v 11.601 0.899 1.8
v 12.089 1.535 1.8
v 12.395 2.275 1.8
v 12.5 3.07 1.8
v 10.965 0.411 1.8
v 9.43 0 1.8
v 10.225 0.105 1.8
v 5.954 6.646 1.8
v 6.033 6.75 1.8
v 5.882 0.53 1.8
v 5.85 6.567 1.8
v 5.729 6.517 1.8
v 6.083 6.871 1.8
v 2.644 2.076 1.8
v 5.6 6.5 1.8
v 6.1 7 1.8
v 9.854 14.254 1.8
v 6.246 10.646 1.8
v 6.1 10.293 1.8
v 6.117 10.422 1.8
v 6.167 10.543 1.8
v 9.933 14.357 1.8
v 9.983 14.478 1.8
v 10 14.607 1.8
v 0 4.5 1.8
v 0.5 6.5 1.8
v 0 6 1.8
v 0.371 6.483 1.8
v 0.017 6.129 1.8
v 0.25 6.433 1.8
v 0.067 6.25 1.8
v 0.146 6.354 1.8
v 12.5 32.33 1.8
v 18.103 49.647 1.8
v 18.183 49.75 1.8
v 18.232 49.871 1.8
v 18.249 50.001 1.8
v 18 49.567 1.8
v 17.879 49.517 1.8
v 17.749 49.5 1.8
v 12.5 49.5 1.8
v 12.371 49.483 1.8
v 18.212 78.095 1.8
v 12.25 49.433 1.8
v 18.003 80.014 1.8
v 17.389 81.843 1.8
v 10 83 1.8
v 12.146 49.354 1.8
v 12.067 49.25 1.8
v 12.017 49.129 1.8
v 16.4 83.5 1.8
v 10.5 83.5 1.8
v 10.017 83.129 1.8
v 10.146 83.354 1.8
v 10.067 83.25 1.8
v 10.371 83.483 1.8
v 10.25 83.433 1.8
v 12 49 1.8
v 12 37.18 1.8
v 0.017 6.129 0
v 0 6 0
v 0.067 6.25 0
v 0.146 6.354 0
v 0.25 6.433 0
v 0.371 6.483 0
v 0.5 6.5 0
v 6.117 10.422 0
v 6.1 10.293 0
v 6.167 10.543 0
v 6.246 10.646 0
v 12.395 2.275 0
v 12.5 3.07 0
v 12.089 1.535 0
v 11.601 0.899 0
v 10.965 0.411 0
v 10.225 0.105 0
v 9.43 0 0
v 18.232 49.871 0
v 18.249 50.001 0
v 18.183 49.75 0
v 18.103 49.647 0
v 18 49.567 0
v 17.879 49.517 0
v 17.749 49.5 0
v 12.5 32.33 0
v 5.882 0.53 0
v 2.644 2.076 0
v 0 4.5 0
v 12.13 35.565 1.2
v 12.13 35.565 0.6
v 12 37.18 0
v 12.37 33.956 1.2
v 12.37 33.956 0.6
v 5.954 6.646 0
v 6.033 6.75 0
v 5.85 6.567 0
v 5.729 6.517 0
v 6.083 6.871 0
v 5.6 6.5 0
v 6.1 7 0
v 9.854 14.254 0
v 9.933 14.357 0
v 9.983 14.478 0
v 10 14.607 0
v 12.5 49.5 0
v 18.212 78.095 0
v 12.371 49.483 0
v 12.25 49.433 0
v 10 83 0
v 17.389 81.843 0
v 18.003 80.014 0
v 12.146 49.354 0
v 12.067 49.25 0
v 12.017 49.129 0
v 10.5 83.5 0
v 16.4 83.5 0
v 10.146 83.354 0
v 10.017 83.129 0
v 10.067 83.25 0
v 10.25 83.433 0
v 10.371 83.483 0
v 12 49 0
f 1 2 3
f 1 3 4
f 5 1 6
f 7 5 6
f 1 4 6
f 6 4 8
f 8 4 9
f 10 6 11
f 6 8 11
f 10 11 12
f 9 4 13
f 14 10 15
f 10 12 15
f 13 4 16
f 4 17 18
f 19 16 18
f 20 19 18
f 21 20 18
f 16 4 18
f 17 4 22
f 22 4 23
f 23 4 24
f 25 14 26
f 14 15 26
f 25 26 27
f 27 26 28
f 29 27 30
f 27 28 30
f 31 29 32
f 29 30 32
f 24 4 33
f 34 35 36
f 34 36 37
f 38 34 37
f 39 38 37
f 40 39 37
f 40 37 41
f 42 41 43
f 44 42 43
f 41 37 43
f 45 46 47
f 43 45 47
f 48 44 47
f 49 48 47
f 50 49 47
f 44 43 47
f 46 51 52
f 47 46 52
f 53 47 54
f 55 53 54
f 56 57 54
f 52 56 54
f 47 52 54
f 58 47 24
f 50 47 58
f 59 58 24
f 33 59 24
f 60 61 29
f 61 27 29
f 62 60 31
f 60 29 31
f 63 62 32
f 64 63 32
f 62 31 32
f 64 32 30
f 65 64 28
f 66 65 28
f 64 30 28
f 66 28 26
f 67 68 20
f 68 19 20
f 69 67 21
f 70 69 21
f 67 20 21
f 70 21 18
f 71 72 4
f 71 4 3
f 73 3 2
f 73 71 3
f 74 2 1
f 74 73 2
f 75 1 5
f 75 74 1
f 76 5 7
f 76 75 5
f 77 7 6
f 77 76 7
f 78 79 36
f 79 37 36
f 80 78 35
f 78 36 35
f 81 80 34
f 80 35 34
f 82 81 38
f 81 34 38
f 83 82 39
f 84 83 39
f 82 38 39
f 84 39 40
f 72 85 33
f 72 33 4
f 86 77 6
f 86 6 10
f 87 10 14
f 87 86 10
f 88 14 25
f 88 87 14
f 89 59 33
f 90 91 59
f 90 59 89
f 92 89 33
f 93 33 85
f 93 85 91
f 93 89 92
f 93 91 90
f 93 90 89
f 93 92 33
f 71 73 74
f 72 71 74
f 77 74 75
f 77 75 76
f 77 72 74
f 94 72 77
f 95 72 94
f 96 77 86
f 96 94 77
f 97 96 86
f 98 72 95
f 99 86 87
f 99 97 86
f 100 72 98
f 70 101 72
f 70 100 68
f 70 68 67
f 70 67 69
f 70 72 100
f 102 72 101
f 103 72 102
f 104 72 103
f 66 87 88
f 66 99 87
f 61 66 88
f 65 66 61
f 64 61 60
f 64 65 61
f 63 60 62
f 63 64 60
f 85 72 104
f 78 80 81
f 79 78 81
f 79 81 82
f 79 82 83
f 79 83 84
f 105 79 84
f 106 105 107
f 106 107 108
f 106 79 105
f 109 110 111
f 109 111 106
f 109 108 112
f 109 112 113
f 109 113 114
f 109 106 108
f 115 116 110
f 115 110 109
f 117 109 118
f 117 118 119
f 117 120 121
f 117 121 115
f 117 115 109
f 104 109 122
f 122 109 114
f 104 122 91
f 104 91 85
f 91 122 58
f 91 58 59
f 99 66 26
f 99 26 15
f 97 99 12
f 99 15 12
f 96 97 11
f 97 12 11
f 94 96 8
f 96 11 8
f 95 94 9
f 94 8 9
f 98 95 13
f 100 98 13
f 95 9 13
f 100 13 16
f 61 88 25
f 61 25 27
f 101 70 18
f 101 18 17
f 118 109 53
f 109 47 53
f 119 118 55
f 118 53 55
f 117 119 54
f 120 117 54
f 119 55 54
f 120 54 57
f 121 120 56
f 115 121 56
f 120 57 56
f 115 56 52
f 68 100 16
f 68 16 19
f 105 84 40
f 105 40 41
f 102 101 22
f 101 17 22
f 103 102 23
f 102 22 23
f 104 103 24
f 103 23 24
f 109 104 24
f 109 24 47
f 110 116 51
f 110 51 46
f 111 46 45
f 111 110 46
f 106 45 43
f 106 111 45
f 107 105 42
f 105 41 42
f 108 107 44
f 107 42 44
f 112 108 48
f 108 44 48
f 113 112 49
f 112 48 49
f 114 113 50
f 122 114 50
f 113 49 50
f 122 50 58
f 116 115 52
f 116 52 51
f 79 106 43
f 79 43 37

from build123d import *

# Parameters (mm, degrees)
BOSS_EXTRUDE1_DEPTH = 1.8
FILLET1_R           = 0.5


with BuildPart() as part:
    # Sketch1 → Boss-Extrude1 (new body)
    with BuildSketch(Plane.XY):
        with BuildLine():
            Line((0, 4.5), (0, 6.5))
            Line((0, 6.5), (6.1, 6.5))
            Line((6.1, 6.5), (6.1, 10.5))
            Line((6.1, 10.5), (10, 14.4))
            Line((10, 14.4), (10, 83.5))
            Line((10, 83.5), (16.4, 83.5))
            ThreePointArc((16.4, 83.5), (17.745328581, 80.945017946), (18.212299295, 78.095495067))
            Line((18.212299295, 78.095495067), (18.25, 49.5))
            Line((18.25, 49.5), (12, 49.5))
            Line((12, 49.5), (12, 37.18))
            add(Edge.make_bspline(
                [(12, 37.18), (12, 35.554764974), (12.5, 33.972282338), (12.5, 32.33)],
                knots=[0, 0, 0, 0, 1, 1, 1, 1], degree=3))
            Line((12.5, 32.33), (12.5, 3.07))
            ThreePointArc((12.5, 3.07), (11.600817818, 0.899182182), (9.43, 0))
            ThreePointArc((9.43, 0), (4.205660329, 1.182650422), (0, 4.5))
        make_face()
    extrude(amount=BOSS_EXTRUDE1_DEPTH)

    # Fillet1
    fillet1_edges = [part.edges().sort_by_distance(p)[0] for p in [
        (0, 6.5, 0.9),
        (6.1, 6.5, 0.9),
        (6.1, 10.5, 0.9),
        (10, 14.4, 0.9),
        (10, 83.5, 0.9),
        (18.25, 49.5, 0.9),
        (12, 49.5, 0.9),
    ]]
    fillet(fillet1_edges, radius=FILLET1_R)


solid = part.part
